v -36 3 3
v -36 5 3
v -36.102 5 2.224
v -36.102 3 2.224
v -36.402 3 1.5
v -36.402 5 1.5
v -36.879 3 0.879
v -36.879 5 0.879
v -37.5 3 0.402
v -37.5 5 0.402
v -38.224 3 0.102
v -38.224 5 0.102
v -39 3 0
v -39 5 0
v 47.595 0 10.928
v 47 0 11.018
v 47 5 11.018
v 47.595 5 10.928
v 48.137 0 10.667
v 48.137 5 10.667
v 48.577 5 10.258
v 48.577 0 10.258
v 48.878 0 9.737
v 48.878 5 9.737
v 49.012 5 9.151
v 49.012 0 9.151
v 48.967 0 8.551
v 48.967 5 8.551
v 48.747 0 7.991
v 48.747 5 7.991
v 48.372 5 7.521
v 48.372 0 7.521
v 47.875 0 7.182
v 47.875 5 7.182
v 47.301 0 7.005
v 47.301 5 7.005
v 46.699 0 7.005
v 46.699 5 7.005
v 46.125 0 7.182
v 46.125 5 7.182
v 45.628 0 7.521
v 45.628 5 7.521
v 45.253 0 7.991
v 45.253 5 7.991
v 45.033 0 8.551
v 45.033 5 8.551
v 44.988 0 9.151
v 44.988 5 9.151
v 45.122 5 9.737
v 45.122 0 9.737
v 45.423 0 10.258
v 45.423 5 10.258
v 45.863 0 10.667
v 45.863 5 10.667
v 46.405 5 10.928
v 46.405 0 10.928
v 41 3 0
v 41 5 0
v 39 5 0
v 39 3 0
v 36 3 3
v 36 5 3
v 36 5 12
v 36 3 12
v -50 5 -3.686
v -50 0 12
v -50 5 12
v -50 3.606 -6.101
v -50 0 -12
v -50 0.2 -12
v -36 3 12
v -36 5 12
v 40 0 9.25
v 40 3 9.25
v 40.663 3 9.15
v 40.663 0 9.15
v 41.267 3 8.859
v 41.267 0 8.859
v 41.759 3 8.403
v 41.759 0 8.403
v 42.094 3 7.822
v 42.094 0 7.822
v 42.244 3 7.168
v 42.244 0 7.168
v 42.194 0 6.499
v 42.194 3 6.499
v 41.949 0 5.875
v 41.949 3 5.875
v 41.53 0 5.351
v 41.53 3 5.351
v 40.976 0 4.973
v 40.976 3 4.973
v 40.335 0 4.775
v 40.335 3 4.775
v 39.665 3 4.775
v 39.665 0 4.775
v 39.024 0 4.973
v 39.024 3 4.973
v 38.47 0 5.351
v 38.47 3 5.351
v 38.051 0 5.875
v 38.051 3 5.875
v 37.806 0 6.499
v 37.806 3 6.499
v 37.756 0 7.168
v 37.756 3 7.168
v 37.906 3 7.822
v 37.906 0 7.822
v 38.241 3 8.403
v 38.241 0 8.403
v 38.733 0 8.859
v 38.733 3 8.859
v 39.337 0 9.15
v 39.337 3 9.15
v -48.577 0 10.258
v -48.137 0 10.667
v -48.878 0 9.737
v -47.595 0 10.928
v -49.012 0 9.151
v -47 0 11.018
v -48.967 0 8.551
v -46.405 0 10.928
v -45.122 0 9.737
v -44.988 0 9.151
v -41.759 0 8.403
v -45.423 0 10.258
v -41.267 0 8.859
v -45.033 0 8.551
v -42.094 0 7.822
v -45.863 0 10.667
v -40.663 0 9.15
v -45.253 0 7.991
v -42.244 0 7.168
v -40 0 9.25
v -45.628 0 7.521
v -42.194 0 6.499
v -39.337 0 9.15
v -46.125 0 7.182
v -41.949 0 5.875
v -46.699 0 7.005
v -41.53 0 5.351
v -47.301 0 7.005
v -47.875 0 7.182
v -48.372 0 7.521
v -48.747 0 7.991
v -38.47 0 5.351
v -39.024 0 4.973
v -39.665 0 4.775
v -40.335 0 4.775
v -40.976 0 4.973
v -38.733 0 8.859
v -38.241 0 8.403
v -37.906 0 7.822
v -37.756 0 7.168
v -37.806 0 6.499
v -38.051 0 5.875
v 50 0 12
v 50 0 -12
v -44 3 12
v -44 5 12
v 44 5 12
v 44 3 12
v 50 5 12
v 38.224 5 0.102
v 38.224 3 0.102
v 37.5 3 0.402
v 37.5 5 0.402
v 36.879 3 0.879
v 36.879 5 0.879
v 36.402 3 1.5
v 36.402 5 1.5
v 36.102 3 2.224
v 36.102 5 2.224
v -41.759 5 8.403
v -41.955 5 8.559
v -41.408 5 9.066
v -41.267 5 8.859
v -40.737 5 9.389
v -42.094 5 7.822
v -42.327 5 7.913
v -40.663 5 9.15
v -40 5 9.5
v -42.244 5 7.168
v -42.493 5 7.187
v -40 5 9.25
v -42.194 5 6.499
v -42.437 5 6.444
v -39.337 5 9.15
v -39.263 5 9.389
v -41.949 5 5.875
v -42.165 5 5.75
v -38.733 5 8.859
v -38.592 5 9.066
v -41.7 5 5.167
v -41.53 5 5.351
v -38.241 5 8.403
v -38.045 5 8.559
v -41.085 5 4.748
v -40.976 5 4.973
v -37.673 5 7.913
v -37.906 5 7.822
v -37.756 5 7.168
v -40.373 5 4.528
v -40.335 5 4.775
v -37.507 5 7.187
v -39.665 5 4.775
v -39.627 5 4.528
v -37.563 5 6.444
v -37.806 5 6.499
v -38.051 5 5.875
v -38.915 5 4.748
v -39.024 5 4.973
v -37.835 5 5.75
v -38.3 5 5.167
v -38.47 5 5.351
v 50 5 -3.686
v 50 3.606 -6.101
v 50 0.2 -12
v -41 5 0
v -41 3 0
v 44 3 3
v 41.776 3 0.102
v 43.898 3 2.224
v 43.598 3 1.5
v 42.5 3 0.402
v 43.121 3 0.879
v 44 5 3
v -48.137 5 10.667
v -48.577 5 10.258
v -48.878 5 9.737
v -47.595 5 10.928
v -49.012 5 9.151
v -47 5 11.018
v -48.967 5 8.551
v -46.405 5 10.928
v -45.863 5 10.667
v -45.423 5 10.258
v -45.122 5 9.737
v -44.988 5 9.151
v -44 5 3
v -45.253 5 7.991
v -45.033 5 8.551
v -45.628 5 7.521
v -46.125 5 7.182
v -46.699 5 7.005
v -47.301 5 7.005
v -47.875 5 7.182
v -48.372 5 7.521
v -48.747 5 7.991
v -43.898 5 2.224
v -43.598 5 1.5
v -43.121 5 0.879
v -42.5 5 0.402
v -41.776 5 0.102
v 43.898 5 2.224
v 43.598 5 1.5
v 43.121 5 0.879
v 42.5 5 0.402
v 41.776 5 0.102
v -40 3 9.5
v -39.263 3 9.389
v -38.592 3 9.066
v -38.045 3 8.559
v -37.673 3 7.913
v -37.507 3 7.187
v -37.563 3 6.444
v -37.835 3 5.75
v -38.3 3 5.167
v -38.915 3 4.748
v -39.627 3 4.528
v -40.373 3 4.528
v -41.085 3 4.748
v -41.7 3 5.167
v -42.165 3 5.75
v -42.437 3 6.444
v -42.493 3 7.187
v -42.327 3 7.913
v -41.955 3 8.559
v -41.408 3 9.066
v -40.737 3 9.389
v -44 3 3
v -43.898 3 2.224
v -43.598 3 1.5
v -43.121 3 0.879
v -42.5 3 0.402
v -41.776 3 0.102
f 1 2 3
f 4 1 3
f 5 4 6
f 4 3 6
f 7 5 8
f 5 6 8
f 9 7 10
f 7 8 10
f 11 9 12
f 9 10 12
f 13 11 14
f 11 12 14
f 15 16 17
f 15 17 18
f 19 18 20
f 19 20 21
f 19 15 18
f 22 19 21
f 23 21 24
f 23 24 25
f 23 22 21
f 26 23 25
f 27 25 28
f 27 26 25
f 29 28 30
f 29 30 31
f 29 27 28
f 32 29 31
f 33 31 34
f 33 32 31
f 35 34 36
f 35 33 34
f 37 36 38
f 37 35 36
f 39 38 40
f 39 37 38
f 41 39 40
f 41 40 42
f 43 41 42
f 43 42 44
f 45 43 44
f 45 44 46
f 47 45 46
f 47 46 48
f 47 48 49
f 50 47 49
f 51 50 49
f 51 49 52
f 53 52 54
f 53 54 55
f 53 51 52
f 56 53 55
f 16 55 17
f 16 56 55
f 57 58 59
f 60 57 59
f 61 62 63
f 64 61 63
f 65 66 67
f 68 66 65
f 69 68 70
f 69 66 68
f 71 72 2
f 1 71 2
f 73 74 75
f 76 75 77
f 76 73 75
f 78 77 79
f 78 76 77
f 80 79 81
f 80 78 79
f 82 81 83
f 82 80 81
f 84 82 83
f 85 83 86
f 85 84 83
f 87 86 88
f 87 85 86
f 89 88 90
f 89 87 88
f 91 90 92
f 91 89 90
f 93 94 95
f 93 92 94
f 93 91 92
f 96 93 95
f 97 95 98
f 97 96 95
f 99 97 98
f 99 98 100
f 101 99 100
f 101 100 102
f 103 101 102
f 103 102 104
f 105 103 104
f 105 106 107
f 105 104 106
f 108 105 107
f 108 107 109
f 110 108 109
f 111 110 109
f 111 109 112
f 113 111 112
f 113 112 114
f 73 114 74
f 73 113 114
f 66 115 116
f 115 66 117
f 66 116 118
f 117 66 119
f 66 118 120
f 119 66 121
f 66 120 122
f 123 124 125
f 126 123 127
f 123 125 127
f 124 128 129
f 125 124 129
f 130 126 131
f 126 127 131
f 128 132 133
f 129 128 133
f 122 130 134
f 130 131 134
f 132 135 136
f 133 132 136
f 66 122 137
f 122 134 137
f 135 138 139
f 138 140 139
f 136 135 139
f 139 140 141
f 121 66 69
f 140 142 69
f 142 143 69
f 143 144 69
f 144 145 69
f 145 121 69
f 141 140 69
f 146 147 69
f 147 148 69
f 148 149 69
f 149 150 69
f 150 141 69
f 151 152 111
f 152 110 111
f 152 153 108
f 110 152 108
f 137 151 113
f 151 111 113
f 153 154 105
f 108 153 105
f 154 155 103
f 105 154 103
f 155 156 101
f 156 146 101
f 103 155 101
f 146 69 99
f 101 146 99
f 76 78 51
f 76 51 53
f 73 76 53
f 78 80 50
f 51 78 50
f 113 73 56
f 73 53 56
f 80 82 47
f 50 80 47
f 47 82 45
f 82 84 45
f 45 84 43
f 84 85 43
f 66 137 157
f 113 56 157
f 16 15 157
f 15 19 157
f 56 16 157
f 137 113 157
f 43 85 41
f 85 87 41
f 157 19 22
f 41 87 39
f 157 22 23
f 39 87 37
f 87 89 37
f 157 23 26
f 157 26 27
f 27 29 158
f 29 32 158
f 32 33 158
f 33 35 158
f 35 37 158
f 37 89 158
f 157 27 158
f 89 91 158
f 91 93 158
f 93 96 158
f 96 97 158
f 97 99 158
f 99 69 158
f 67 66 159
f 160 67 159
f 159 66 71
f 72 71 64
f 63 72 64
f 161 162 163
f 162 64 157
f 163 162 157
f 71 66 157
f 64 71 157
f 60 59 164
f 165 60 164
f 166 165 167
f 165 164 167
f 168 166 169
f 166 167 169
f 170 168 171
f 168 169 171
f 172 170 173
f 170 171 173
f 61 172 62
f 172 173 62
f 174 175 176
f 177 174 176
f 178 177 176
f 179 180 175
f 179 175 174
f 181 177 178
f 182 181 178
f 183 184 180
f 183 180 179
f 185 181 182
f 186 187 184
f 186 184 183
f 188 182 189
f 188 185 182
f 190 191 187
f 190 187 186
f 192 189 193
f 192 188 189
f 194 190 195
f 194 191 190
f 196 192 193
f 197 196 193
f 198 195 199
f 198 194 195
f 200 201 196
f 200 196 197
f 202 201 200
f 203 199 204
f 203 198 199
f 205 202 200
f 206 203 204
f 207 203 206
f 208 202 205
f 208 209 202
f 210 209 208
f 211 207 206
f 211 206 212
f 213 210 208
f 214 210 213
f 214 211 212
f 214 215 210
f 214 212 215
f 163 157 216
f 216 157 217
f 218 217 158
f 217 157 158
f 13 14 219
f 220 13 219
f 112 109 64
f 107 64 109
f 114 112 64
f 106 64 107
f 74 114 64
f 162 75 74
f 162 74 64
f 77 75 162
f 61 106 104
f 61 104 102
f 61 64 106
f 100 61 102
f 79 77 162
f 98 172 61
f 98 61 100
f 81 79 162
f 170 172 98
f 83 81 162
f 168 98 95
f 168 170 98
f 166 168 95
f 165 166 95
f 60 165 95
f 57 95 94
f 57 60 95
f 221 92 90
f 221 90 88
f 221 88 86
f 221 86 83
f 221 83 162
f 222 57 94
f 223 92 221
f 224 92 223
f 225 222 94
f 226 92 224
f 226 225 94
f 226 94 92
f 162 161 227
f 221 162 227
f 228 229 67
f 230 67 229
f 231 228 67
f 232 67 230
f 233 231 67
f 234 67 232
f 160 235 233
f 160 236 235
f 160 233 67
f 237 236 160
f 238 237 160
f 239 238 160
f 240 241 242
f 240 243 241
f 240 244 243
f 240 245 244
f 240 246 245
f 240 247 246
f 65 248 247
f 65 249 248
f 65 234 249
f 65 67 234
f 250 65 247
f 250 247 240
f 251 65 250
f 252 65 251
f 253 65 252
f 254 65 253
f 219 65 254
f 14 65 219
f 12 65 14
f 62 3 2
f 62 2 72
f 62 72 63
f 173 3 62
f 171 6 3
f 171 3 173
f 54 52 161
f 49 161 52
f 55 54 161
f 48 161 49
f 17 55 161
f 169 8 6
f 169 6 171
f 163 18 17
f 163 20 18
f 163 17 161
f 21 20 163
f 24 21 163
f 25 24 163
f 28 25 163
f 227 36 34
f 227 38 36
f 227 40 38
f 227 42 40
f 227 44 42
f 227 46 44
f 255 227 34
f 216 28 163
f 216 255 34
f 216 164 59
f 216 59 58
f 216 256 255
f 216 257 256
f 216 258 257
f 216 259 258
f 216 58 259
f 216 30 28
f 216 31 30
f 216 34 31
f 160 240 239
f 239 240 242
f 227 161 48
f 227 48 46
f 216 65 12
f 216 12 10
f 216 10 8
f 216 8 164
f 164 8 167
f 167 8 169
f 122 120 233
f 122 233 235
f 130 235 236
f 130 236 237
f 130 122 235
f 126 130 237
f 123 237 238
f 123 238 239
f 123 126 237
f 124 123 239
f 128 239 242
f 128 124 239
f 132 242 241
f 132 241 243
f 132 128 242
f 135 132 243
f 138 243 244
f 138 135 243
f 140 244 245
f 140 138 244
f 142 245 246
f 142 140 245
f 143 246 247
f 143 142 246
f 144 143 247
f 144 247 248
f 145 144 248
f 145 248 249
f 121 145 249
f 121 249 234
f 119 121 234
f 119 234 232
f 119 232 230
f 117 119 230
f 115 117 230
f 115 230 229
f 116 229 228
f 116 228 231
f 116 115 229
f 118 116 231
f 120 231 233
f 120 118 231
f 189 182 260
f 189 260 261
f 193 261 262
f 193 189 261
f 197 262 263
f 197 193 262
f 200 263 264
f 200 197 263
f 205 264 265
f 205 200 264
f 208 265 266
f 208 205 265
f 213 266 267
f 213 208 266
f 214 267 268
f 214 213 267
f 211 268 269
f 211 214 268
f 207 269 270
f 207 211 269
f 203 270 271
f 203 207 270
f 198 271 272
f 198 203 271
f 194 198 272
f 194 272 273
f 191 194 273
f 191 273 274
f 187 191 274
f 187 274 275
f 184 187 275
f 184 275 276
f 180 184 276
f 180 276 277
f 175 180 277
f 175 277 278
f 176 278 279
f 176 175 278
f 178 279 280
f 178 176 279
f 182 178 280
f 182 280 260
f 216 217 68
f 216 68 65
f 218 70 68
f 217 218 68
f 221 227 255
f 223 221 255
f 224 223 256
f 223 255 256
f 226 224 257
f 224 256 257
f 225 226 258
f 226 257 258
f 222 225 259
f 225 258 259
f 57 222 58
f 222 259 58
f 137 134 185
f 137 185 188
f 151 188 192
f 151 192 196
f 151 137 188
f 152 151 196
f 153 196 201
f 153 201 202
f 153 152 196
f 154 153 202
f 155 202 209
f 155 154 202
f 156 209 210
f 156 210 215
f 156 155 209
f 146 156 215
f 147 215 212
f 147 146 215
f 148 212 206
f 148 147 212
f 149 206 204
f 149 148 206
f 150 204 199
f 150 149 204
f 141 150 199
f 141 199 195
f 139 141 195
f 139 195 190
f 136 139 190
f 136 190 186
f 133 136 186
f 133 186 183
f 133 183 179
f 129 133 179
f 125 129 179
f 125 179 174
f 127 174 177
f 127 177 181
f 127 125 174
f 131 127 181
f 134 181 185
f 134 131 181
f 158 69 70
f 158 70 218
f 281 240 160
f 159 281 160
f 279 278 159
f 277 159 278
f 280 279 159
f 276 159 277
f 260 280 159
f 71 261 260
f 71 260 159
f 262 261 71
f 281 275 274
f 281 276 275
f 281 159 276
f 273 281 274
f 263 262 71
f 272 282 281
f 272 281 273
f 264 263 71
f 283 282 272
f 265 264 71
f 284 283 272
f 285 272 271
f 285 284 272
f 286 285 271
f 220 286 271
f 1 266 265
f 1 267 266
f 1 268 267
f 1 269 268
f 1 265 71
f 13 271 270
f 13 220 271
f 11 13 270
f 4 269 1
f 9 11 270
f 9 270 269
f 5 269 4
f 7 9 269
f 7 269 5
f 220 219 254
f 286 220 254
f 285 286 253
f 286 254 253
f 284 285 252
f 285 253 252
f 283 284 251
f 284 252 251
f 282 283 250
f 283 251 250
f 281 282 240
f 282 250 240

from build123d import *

# Parameters (mm, degrees)
CROQUIS1_W              = 100
CROQUIS1_H              = 24
CROQUIS1_R              = 2.017504942
CROQUIS1_R_2            = 2.25
SALIENTE_EXTRUIR1_DEPTH = 5
CROQUIS2_R              = 2.5
CORTAR_EXTRUIR1_DEPTH   = 2
CORTAR_EXTRUIR5_DEPTH   = 141


with BuildPart() as part:
    # Croquis1 → Saliente-Extruir1 (new body)
    with BuildSketch(Plane(origin=(0, 0, 0), x_dir=(1, 0, 0), z_dir=(0, 1, 0))):
        Rectangle(CROQUIS1_W, CROQUIS1_H)
        with Locations(Location((-47, -9, 0), (0, 0, 270))):
            Circle(CROQUIS1_R, mode=Mode.SUBTRACT)
        with Locations(Location((-40, -7, 0), (0, 0, 270))):
            Circle(CROQUIS1_R_2, mode=Mode.SUBTRACT)
        with Locations(Location((40, -7, 0), (0, 0, 270))):
            Circle(CROQUIS1_R_2, mode=Mode.SUBTRACT)
        with Locations(Location((47, -9, 0), (0, 0, 270))):
            Circle(CROQUIS1_R, mode=Mode.SUBTRACT)
    extrude(amount=SALIENTE_EXTRUIR1_DEPTH)

    # Croquis2 → Cortar-Extruir1 (cut)
    # profile 1 of 2: a face of its own
    with BuildSketch(Plane(origin=(0, 5, 0), x_dir=(1, 0, 0), z_dir=(0, 1, 0))):
        with BuildLine():
            Line((-44, -3), (-44, -12))
            Line((-44, -12), (-36, -12))
            Line((-36, -12), (-36, -3))
            ThreePointArc((-36, -3), (-36.878679656, -0.878679656), (-39, 0))
            Line((-39, 0), (-41, 0))
            ThreePointArc((-41, 0), (-43.121320344, -0.878679656), (-44, -3))
        make_face()
        with Locations(Location((-40, -7, 0), (0, 0, 270))):
            Circle(CROQUIS2_R, mode=Mode.SUBTRACT)
    # profile 2 of 2: a face of its own
    with BuildSketch(Plane(origin=(0, 5, 0), x_dir=(1, 0, 0), z_dir=(0, 1, 0))):
        with BuildLine():
            Line((41, 0), (39, 0))
            ThreePointArc((39, 0), (36.878679656, -0.878679656), (36, -3))
            Line((36, -3), (36, -12))
            Line((36, -12), (44, -12))
            Line((44, -12), (44, -3))
            ThreePointArc((44, -3), (43.121320344, -0.878679656), (41, 0))
        make_face()
    extrude(amount=-CORTAR_EXTRUIR1_DEPTH, mode=Mode.SUBTRACT)

    # Croquis3 → Cortar-Extruir5 (cut)
    with BuildSketch(Plane.ZY.offset(50)):
        Polygon((-12, 5), (-12, 0.2), (-6.100895765, 3.605849418), (-3.686156124, 5), align=None)
        Polygon((-12.757171087, 0.2), (-12, 0.2), (-12, 5), (-3.686156124, 5), (-3.039853353, 5.373143079), (-12.757171087, 5.373143079), align=None)
    extrude(amount=-CORTAR_EXTRUIR5_DEPTH, mode=Mode.SUBTRACT)


solid = part.part
